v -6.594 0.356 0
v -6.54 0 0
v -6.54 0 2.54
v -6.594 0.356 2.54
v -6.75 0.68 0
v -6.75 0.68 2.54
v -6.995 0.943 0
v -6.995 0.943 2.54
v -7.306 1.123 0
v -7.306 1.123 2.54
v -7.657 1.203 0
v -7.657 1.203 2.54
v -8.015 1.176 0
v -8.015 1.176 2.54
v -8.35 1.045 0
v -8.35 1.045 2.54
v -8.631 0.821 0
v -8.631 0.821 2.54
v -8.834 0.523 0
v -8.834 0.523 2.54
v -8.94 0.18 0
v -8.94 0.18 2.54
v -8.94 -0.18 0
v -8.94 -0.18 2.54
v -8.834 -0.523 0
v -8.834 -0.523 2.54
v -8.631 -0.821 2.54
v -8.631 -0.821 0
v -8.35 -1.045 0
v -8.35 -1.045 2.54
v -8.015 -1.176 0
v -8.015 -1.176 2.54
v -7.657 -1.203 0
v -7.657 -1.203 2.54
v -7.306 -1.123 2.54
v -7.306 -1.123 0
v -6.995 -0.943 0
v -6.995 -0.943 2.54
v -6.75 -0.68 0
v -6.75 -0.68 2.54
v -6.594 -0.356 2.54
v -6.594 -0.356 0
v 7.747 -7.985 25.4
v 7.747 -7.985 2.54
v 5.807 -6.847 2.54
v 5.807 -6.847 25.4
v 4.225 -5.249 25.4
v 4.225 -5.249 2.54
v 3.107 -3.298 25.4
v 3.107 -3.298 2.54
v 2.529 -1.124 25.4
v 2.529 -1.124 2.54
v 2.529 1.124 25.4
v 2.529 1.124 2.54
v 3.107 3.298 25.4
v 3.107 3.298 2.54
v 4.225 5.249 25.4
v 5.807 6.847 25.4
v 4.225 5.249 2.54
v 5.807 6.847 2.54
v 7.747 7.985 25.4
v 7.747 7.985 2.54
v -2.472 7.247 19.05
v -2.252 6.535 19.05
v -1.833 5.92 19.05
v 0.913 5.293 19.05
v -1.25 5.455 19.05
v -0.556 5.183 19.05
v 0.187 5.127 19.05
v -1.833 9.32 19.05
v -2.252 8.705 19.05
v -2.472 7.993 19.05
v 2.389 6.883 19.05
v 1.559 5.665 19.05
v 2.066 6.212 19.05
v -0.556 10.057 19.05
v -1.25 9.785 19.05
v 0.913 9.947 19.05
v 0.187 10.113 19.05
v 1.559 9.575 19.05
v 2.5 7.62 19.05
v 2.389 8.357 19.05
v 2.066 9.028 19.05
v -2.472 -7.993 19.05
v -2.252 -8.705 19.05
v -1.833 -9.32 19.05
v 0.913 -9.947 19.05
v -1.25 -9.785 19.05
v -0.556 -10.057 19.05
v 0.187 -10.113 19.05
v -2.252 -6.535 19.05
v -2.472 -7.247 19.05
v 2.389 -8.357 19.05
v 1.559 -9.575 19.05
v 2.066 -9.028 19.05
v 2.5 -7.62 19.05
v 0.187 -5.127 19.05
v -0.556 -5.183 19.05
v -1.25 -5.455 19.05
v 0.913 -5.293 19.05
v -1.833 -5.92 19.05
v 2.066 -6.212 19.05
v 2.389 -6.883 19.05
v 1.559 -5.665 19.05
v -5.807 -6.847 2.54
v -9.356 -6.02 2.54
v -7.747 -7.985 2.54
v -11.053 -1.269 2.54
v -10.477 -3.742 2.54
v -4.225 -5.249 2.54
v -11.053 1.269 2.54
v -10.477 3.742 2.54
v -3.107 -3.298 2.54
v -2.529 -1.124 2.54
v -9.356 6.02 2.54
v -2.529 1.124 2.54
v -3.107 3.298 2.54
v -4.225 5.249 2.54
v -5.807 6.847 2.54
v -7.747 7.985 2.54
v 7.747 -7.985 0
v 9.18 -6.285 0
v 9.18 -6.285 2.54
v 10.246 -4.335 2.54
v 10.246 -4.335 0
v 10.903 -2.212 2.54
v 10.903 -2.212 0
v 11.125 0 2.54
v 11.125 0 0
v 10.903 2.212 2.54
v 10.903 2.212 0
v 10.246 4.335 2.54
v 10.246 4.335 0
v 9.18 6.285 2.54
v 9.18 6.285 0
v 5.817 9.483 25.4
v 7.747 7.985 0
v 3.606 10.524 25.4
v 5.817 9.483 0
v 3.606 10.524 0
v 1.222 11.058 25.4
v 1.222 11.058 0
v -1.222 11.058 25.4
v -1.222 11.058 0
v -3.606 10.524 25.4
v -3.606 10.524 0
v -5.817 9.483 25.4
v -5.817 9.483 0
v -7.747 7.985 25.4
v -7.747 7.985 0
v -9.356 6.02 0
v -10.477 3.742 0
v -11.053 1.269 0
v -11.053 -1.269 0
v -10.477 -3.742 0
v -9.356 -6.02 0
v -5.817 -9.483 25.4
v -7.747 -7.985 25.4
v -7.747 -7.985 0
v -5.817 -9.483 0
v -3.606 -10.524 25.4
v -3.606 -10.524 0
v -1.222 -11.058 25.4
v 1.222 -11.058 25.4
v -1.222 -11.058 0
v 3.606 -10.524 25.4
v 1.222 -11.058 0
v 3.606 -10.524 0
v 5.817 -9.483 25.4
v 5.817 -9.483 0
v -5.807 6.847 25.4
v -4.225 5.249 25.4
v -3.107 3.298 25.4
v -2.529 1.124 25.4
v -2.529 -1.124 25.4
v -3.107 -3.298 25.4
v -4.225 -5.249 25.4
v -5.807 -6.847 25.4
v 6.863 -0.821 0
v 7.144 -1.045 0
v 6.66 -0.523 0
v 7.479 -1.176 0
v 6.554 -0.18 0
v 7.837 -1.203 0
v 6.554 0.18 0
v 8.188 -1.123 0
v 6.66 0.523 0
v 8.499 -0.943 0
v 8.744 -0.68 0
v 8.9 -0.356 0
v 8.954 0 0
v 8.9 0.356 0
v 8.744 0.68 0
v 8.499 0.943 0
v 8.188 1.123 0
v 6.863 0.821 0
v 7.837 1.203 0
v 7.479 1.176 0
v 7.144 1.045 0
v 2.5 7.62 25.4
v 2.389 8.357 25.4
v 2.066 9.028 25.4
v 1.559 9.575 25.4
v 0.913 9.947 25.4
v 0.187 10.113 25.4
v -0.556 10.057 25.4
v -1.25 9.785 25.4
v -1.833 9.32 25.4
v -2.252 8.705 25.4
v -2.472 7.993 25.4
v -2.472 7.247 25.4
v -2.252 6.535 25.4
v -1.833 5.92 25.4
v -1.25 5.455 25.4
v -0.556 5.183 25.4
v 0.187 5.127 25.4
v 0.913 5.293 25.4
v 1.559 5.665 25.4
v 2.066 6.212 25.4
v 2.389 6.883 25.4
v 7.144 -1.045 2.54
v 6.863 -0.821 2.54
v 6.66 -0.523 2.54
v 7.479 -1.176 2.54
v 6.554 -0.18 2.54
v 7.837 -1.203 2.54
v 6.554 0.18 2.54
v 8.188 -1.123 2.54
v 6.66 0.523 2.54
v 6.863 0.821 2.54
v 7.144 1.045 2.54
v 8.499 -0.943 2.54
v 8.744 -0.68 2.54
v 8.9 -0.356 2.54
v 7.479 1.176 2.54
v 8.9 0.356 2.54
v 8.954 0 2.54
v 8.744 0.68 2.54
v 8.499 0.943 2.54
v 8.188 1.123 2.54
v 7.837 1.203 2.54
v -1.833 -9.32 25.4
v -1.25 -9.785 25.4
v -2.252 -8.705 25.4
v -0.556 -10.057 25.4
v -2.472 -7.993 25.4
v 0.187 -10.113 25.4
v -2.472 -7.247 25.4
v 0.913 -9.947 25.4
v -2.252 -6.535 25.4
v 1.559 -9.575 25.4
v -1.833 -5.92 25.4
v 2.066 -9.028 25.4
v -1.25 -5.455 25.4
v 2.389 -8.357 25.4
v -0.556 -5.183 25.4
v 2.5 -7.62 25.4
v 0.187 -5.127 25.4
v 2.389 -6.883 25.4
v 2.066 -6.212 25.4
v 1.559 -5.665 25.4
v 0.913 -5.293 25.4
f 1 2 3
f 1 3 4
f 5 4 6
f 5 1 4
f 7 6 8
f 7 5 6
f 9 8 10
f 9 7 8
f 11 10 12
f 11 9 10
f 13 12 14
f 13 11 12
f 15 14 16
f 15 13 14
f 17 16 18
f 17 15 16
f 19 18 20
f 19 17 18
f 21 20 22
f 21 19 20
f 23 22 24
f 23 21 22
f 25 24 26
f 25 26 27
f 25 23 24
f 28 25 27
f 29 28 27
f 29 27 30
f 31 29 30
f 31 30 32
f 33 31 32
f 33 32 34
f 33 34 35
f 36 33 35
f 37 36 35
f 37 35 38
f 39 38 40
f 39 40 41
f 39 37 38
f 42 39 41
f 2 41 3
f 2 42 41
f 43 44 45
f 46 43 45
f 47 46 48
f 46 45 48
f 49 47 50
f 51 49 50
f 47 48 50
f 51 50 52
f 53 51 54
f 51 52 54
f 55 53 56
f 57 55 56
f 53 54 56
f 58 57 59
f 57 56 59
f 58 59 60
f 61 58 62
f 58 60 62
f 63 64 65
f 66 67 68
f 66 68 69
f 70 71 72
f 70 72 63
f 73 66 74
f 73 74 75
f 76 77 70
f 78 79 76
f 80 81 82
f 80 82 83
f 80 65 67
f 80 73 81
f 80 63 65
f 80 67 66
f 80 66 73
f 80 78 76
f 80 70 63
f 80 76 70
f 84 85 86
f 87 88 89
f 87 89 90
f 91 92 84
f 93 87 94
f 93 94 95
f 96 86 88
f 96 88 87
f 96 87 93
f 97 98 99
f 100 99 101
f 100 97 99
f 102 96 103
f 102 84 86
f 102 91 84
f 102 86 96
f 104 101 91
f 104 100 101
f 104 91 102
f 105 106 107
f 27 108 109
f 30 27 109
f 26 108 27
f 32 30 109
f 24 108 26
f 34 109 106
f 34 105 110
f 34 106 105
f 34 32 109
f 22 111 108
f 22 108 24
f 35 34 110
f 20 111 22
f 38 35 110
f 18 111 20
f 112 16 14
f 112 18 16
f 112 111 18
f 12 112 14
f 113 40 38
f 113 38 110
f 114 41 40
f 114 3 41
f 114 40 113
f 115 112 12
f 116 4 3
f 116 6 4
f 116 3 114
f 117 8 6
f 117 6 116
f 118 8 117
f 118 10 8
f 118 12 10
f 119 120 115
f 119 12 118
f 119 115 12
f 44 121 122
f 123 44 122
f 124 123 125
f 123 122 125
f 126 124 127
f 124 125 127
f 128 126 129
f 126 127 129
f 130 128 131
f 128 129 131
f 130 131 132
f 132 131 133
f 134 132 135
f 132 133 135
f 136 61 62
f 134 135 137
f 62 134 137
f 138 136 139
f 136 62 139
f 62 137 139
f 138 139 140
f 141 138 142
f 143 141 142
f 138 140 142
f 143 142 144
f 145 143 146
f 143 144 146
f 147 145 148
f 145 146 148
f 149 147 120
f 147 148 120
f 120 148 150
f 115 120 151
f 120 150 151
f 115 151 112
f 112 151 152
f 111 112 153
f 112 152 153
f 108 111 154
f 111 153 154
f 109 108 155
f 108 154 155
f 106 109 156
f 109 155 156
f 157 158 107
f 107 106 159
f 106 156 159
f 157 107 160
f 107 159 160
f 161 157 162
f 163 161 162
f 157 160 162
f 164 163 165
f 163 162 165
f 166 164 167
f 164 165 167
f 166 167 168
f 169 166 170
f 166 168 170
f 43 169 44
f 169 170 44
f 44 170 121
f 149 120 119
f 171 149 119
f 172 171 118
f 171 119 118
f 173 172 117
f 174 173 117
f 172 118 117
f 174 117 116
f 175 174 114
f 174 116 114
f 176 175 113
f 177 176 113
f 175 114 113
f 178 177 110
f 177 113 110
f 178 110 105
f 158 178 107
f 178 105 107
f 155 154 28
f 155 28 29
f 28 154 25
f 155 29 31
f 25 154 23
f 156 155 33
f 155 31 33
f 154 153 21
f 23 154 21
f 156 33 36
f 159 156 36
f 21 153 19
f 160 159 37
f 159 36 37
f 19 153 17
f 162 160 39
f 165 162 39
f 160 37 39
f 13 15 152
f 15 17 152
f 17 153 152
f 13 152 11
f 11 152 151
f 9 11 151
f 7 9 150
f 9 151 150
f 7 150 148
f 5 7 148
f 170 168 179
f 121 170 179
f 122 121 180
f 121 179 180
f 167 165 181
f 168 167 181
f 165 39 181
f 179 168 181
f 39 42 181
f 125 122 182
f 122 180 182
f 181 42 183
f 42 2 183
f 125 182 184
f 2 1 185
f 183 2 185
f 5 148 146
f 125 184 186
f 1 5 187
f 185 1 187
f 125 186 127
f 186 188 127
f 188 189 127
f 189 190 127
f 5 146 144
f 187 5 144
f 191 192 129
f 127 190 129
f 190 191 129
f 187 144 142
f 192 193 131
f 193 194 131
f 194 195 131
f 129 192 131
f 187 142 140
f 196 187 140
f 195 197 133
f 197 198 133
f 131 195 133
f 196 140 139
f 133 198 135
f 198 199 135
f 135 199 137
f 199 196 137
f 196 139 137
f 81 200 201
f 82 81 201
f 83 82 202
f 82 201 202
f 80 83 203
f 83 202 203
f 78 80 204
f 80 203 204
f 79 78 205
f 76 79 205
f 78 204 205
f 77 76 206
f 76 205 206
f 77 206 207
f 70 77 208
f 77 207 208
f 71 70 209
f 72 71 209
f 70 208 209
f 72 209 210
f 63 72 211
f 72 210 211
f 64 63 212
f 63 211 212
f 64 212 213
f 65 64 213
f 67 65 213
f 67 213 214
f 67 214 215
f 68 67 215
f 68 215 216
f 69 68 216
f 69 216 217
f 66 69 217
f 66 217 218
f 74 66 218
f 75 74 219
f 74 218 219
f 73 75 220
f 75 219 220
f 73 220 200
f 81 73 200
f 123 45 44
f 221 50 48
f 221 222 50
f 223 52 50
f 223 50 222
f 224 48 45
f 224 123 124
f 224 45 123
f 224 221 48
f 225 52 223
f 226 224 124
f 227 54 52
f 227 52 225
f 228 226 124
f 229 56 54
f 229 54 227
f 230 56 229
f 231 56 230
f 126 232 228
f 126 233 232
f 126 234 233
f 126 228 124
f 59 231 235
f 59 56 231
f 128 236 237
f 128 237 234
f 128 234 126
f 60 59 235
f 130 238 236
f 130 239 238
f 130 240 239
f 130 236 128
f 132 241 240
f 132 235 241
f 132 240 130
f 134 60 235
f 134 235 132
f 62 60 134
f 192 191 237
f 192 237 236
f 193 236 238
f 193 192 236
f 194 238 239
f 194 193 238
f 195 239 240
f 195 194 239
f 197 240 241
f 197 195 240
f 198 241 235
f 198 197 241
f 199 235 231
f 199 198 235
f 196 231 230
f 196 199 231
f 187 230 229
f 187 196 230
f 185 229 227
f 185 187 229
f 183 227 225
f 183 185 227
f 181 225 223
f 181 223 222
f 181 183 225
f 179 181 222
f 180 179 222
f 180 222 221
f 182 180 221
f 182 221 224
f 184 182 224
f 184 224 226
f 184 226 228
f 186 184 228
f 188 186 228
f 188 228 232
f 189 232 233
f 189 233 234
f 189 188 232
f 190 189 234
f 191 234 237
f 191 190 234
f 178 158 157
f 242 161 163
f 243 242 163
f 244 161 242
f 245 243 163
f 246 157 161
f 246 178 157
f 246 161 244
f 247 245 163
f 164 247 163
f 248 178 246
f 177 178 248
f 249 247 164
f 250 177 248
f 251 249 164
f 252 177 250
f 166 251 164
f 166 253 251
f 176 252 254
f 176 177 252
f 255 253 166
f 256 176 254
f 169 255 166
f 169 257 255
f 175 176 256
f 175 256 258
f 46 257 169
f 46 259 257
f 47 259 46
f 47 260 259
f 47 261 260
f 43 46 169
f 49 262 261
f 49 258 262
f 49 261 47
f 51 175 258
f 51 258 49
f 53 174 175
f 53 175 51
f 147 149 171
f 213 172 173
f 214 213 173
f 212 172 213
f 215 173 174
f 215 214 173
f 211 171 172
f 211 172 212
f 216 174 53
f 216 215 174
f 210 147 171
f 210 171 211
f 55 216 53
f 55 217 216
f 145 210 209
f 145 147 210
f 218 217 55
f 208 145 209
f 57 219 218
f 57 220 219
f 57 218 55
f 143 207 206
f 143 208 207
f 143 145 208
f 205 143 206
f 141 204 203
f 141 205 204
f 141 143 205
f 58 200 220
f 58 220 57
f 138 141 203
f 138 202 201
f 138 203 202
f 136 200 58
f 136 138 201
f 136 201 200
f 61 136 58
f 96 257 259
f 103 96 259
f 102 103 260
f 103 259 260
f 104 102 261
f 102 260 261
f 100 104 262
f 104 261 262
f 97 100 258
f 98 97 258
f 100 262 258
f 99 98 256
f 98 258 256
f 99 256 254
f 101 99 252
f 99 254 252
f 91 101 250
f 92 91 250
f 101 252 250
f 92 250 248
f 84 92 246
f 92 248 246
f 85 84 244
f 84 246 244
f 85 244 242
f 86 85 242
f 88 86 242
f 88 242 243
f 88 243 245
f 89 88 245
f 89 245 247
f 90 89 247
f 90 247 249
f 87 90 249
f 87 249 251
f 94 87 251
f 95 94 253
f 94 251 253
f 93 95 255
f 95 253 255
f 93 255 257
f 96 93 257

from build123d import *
from build123d import SkipClean  # not in build123d's __all__

# Parameters (mm, degrees)
F0_R     = 1.2065
F1_DEPTH = 2.54
F3_DEPTH = 22.86
F4_R     = 2.5
F5_DEPTH = 6.35


# Not quite as in the source:
# - a feature names something its author has since deleted; it is built from what else it names


with BuildPart() as f1:
    # F0 (on Top) → F1 (new body)
    with BuildSketch(Plane.XY):
        with BuildLine():
            ThreePointArc((7.747, -7.9846143326), (2.4553498698, 0), (7.747, 7.9846143326))
            ThreePointArc((7.747, 7.9846143326), (0, 11.1252), (-7.747, 7.9846143326))
            ThreePointArc((-7.747, 7.9846143326), (-2.4553498698, 0), (-7.747, -7.9846143326))
            ThreePointArc((-7.747, -7.9846143326), (0, -11.1252), (7.747, -7.9846143326))
        make_face()
        with BuildLine():
            ThreePointArc((-7.747, -7.9846143326), (-2.4553498698, 0), (-7.747, 7.9846143326))
            ThreePointArc((-7.747, 7.9846143326), (-11.1252, 0), (-7.747, -7.9846143326))
        make_face()
        with Locations((-7.747, 0)):
            Circle(F0_R, mode=Mode.SUBTRACT)
        with BuildLine():
            ThreePointArc((7.747, -7.9846143326), (10.245901606, -4.3349250651), (11.1252, 0))
            ThreePointArc((11.1252, 0), (10.245901606, 4.3349250651), (7.747, 7.9846143326))
            ThreePointArc((7.747, 7.9846143326), (2.4553498698, 0), (7.747, -7.9846143326))
        make_face()
        with Locations((7.747, 0)):
            Circle(F0_R, mode=Mode.SUBTRACT)
    extrude(amount=F1_DEPTH)

    # F2 (on face) → F3 (join)
    with BuildSketch(Plane.XY.offset(2.54)):
        with BuildLine():
            ThreePointArc((-7.747, 7.9846143326), (-2.4553498698, 0), (-7.747, -7.9846143326))
            ThreePointArc((-7.747, -7.9846143326), (0, -11.1252), (7.747, -7.9846143326))
            ThreePointArc((7.747, -7.9846143326), (2.4553498698, 0), (7.747, 7.9846143326))
            ThreePointArc((7.747, 7.9846143326), (0, 11.1252), (-7.747, 7.9846143326))
        make_face()
    with SkipClean():  # cleaning this boolean's faces spoils the solid; the shape is the same uncleaned
        extrude(amount=F3_DEPTH)

    # F4 (on face) → F5 (cut)
    with BuildSketch(Plane.XY.offset(25.4)):
        with Locations((0, 7.62)):
            Circle(F4_R)
        with Locations((0, -7.62)):
            Circle(F4_R)
    extrude(amount=-F5_DEPTH, mode=Mode.SUBTRACT)


solid = f1.part
